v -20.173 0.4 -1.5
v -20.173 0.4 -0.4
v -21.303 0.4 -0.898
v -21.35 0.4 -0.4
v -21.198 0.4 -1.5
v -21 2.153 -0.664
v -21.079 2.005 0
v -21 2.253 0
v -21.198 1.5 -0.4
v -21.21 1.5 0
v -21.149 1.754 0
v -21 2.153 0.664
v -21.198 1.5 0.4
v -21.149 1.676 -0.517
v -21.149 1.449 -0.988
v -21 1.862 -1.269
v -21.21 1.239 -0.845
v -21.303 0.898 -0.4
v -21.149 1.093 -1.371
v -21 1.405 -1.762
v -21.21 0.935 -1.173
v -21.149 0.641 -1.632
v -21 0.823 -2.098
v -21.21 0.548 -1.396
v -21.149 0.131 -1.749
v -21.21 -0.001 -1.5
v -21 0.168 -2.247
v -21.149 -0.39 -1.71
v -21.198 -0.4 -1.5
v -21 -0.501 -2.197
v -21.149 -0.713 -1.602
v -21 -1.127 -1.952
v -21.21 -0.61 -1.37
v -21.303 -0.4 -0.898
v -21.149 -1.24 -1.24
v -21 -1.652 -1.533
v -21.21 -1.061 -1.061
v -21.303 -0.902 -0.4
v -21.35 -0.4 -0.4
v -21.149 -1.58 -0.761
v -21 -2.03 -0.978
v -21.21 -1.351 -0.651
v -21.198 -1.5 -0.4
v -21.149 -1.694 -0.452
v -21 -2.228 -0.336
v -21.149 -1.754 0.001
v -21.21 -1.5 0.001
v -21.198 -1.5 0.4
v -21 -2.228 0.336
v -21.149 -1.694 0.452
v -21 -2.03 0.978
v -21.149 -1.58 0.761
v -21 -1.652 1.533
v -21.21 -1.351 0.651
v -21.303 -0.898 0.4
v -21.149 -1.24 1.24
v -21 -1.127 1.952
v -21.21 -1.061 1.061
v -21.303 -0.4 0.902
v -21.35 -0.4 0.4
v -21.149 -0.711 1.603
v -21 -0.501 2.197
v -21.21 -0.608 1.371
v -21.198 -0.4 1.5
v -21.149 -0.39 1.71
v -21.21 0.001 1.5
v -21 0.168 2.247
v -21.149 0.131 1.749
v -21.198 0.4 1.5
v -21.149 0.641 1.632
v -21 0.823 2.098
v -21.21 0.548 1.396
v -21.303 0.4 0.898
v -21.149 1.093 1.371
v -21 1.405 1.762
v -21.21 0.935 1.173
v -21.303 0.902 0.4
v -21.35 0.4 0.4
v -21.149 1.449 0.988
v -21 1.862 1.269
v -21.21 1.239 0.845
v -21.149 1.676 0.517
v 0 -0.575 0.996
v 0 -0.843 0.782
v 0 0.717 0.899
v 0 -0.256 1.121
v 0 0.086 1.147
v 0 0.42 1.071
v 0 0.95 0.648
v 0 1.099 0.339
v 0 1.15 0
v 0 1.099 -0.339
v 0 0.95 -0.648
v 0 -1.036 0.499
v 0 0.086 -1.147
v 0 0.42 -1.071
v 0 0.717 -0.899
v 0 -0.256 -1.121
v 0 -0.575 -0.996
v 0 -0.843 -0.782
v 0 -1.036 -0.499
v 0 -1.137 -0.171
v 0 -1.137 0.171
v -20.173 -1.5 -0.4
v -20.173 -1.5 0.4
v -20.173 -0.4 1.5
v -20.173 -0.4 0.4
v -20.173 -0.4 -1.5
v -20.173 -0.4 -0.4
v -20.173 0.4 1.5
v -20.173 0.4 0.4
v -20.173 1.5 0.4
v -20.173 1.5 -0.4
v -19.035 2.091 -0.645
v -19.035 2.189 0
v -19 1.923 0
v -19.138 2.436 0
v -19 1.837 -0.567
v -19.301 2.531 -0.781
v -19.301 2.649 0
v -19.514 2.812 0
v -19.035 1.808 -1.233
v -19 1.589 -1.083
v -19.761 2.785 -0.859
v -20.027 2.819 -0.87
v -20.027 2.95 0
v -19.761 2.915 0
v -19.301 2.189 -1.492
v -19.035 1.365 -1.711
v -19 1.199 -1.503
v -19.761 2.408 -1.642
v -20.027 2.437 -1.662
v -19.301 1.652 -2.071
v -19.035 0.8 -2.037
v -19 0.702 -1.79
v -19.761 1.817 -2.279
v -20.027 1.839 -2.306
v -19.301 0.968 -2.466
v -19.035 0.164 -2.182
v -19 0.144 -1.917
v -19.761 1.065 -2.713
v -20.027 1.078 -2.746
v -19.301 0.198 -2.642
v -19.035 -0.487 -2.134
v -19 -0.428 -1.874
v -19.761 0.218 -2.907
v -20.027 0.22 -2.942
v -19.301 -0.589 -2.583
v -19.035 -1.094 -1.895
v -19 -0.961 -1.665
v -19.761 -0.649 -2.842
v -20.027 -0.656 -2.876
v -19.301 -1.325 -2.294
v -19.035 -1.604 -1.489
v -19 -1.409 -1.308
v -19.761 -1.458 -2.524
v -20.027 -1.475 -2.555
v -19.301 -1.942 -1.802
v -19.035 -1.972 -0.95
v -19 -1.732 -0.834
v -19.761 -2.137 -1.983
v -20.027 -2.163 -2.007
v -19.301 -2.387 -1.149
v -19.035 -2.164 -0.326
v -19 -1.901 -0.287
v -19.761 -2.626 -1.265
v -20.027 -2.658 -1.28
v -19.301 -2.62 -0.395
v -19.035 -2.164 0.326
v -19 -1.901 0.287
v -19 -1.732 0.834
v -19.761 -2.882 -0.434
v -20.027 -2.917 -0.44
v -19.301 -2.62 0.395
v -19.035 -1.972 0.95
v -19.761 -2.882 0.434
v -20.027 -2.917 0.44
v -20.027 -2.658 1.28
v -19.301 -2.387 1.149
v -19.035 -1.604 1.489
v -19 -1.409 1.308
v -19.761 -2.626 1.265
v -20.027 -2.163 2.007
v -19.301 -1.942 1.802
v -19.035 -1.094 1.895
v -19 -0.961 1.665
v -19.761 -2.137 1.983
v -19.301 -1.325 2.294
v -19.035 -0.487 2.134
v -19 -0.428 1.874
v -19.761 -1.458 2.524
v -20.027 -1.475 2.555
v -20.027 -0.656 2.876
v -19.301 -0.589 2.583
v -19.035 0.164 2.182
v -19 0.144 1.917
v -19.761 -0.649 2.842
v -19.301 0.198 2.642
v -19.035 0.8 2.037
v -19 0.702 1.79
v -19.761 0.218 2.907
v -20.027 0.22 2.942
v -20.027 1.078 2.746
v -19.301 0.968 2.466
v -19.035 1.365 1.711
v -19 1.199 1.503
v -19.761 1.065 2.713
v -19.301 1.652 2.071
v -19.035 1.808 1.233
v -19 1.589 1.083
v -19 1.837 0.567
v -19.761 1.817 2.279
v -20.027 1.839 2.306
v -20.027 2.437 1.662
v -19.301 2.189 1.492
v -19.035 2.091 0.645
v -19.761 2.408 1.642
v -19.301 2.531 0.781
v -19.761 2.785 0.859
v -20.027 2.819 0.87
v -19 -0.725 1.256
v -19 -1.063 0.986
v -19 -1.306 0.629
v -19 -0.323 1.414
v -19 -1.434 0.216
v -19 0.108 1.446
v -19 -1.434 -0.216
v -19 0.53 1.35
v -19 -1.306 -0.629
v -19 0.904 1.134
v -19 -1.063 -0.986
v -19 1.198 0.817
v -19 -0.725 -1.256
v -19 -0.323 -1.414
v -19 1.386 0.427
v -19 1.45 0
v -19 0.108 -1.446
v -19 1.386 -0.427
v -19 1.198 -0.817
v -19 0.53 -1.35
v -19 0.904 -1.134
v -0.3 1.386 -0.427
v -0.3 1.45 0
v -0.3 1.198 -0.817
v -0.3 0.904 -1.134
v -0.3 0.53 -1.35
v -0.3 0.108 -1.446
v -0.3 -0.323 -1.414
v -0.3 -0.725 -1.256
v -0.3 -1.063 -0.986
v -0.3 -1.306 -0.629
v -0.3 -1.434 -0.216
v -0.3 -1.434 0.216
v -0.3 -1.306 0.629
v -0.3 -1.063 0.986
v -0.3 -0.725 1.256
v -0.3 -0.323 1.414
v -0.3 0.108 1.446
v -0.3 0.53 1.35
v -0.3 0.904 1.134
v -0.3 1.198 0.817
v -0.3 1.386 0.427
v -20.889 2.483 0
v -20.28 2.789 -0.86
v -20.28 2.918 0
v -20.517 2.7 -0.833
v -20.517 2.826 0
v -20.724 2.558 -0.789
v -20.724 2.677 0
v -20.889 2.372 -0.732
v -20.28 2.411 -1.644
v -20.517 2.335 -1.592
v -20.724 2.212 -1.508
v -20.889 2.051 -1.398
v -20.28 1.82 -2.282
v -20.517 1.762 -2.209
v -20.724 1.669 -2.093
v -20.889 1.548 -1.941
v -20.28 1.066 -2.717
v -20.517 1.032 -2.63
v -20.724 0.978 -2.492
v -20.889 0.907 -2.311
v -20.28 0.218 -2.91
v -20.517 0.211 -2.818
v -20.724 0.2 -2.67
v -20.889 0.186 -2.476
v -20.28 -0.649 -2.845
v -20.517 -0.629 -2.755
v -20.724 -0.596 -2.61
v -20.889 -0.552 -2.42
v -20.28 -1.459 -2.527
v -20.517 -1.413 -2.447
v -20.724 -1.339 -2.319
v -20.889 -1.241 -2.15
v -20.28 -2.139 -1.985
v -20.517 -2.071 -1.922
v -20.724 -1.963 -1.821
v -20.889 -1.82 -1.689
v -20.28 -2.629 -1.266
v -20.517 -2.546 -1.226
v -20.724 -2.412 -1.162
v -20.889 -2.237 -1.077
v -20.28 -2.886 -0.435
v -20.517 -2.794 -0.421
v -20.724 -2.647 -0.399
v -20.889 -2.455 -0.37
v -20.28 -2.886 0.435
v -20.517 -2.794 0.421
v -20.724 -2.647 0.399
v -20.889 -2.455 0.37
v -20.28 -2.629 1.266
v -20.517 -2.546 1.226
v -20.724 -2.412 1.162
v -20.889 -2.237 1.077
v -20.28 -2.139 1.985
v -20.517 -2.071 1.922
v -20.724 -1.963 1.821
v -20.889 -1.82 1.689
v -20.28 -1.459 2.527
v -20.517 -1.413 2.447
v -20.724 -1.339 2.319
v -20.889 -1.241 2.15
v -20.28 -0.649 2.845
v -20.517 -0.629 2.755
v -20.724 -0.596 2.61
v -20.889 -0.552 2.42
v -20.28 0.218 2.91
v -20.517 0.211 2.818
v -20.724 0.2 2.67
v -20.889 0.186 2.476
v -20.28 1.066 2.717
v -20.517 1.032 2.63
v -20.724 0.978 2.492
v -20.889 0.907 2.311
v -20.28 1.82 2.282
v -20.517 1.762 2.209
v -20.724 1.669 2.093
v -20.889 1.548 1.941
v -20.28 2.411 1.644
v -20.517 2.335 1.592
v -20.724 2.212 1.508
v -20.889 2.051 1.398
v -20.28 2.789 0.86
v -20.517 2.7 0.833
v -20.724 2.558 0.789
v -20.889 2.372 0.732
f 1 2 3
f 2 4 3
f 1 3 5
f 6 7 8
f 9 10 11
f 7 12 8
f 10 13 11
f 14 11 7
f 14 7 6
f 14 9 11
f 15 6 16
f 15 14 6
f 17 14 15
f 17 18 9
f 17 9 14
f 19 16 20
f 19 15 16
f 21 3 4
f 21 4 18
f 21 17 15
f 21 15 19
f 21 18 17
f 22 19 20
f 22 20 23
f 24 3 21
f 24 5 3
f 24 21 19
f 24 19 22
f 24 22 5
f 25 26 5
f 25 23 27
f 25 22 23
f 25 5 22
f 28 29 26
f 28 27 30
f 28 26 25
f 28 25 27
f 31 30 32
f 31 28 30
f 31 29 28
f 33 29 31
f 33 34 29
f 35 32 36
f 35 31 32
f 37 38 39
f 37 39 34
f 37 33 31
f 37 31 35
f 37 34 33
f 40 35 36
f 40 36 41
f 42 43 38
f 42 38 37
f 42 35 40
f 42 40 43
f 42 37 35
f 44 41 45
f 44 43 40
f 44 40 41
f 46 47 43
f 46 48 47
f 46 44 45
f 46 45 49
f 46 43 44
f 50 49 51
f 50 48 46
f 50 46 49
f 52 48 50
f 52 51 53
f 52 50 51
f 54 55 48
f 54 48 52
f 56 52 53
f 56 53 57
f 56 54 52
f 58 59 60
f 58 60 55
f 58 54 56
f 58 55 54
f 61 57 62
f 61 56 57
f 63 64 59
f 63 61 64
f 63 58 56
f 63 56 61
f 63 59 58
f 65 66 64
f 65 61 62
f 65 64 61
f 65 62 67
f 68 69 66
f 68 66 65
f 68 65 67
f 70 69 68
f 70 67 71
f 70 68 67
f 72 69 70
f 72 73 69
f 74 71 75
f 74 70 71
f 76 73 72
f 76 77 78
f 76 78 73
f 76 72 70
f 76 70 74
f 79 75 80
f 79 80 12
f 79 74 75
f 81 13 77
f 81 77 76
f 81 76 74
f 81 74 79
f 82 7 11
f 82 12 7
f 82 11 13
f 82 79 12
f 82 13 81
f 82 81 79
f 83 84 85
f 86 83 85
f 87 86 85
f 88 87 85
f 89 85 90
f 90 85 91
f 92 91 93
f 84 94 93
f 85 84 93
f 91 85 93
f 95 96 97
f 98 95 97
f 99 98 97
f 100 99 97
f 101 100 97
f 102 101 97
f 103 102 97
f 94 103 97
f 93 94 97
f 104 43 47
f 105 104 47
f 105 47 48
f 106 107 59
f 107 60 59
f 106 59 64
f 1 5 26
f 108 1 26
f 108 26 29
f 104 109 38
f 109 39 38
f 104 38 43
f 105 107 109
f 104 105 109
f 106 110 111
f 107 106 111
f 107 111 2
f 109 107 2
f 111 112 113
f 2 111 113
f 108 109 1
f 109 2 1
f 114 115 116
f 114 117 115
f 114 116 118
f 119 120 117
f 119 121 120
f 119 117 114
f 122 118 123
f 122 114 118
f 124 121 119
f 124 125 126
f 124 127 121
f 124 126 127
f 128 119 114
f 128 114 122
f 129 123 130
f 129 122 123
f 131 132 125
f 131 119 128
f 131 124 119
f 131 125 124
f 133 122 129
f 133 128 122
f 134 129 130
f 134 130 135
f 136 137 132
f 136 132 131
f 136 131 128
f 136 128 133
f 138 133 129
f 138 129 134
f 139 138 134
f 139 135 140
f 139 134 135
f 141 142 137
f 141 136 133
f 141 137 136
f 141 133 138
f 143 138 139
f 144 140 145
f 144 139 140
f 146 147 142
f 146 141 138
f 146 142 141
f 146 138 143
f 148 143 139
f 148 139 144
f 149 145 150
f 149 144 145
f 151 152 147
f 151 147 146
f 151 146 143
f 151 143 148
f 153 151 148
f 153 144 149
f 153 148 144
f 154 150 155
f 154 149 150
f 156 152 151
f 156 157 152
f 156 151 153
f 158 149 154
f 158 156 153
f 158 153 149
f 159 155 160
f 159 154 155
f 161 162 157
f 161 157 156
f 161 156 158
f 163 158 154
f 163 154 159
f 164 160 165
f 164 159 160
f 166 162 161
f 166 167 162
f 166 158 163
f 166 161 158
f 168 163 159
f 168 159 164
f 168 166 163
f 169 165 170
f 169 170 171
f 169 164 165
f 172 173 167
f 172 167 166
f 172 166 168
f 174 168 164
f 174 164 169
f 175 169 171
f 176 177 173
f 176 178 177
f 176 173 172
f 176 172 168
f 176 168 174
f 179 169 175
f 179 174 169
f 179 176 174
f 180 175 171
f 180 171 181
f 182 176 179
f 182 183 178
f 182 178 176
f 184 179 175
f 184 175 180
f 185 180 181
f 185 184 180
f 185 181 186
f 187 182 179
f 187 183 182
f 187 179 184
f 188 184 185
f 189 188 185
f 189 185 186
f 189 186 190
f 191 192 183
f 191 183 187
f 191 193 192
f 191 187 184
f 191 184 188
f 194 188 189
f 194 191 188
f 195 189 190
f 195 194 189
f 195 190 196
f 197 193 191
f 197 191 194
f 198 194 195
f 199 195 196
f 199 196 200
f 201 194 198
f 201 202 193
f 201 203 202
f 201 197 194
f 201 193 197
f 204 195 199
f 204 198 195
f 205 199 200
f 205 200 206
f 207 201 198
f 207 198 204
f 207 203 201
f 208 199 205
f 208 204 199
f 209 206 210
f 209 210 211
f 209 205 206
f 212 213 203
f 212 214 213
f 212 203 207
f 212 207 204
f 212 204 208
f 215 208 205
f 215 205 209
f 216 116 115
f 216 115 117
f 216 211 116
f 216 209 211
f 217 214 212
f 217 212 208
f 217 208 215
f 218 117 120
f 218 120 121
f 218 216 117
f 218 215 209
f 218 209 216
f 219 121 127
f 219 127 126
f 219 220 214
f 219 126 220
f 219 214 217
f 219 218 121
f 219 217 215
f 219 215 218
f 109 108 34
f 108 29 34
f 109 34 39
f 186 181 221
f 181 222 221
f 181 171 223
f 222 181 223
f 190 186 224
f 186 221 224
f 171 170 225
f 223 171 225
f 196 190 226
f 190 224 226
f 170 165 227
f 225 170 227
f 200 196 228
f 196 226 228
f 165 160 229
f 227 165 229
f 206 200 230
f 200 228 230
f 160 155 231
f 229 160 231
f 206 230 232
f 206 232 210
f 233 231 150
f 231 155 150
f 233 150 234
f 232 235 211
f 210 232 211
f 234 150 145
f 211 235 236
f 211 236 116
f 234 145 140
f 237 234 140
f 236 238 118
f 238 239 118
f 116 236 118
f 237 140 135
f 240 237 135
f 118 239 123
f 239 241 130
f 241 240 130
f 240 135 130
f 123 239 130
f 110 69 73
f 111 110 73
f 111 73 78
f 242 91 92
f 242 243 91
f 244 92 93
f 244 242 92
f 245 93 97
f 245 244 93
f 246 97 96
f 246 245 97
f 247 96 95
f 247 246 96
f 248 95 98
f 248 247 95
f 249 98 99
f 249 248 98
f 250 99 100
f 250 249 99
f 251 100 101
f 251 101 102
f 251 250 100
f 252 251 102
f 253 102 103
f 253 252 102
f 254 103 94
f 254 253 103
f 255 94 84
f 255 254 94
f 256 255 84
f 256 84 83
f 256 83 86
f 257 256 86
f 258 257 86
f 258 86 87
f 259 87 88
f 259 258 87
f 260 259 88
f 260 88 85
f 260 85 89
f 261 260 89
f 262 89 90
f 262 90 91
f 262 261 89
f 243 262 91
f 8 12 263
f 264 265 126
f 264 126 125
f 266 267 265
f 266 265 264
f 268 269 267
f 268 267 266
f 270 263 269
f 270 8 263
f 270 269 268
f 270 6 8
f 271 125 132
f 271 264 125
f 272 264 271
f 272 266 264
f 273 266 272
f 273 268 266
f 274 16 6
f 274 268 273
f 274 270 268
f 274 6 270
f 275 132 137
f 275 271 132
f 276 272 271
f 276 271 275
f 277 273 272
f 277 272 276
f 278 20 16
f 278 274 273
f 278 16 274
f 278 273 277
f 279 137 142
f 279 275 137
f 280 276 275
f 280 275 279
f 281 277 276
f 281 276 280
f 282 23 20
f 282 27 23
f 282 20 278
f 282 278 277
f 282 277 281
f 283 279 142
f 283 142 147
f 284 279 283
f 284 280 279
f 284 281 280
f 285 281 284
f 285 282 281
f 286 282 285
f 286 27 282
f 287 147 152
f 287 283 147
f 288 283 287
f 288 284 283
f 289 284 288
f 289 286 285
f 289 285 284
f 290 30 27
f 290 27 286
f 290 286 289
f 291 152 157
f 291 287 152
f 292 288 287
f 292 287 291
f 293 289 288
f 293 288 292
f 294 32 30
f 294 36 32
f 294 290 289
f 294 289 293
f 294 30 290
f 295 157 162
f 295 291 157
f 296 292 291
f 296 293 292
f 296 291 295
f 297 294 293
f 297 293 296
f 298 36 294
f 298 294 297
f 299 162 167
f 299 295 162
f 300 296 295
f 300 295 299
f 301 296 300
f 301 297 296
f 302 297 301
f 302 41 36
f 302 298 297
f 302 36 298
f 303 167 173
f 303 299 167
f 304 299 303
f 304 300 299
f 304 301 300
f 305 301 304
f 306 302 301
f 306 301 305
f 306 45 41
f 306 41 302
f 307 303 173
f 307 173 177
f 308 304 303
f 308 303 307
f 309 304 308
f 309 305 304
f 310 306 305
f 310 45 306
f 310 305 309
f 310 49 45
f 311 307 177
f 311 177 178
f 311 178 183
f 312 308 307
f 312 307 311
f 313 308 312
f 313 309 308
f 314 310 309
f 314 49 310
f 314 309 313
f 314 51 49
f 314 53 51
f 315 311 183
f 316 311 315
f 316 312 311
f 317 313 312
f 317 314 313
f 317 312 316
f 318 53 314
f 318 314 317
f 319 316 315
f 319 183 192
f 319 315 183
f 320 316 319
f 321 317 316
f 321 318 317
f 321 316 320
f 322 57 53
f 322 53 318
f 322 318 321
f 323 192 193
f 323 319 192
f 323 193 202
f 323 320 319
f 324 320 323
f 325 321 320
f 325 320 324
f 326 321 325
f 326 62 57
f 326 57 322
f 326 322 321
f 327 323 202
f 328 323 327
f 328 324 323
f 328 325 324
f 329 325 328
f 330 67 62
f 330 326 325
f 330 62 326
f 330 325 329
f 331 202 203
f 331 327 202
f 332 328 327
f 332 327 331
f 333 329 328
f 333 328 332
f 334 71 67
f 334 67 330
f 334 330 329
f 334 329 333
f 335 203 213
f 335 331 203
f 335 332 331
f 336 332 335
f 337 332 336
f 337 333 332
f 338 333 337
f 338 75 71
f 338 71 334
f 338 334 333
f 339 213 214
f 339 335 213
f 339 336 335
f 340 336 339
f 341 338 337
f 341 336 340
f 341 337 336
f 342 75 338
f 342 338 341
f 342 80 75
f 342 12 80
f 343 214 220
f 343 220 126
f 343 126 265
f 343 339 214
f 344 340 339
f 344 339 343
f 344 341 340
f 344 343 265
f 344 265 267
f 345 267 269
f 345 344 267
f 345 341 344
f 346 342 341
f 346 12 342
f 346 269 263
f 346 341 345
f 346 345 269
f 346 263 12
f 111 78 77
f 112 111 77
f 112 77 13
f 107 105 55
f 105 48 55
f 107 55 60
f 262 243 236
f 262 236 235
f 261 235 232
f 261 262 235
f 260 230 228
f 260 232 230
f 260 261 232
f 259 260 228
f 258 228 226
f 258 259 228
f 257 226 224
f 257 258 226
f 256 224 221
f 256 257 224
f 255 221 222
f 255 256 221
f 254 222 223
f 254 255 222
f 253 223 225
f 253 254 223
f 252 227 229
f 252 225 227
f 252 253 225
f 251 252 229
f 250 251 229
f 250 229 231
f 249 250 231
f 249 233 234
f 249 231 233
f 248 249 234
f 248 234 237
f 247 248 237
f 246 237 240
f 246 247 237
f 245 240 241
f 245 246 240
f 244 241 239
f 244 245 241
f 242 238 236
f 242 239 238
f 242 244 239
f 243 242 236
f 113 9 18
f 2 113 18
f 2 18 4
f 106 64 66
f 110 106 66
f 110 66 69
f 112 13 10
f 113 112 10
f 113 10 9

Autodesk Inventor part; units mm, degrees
ref_plane "YZ Plane" through (0, 0, 0) normal (1, 0, 0) x (0, 1, 0)
ref_plane "XZ Plane" through (0, 0, 0) normal (0, 1, 0) x (-1, 0, 0)
sketch "Эскиз1" plane through (0, 0, 0) normal (0, 0, 1) x (1, 0, 0)
  line L0 (0, 0) -> (-21.3726, 0)
  arc A0 (-19, 1.9227) -> (-21, 2.2534) centre (-20.0273, 1.9227) ccw
  line L1 (-19, 1.9227) -> (-19, 1.45)
  line L2 (-19, 1.45) -> (0, 1.45)
  line L3 (0, 1.45) -> (0, 0)
  line L4 (-21.6724, 2.95) -> (-19.1128, 2.95)
  arc A1 (-21, 2.2534) -> (-21.3726, 0) centre (-14.3726, 0) ccw
  dimension "d0" = 2.9
  dimension "d1" = 5.9
  dimension "d2" = 2
  dimension "d3" = 19
  dimension "d4" = 7
revolve "Вращение1" add sketch "Эскиз1" angle 360 about axis through (0, 0, 0) along (-1, 0, 0)
chamfer "Фаска1" distance 0.3 angle 45 1 edges at (0, -1.45, 0)
ref_plane "РабПлоскость2" through (-21.3726, 0, 0) normal (1, 0, 0) x (0, 0, -1)
sketch "Эскиз2" plane through (-21.3726, 0, 0) normal (1, 0, 0) x (0, 0, -1)
  line L0 (-0.4, 1.5) -> (0.4, 1.5)
  line L1 (0.4, 1.5) -> (0.4, -1.5)
  line L2 (0.4, -1.5) -> (-0.4, -1.5)
  line L3 (-0.4, -1.5) -> (-0.4, 1.5)
  line L4 (-1.5, 0.4) -> (1.5, 0.4)
  line L5 (1.5, 0.4) -> (1.5, -0.4)
  line L6 (1.5, -0.4) -> (-1.5, -0.4)
  line L7 (-1.5, -0.4) -> (-1.5, 0.4)
  point P0 (0, 0)
  point P1 (0, 1.5)
  point P2 (0, 0.4)
  point P3 (-1.5, 0)
  point P4 (-0.4, 0)
  point P5 (0.4, 0.4)
  point P6 (-0.4, 0.4)
  point P7 (-0.4, -0.4)
  point P8 (0.4, -0.4)
  dimension "d10" = 0.8
  dimension "d11" = 3
extrude "Выдавливание1" cut sketch "Эскиз2" along normal blind 1.2
properties part number "Винт М3х19"
